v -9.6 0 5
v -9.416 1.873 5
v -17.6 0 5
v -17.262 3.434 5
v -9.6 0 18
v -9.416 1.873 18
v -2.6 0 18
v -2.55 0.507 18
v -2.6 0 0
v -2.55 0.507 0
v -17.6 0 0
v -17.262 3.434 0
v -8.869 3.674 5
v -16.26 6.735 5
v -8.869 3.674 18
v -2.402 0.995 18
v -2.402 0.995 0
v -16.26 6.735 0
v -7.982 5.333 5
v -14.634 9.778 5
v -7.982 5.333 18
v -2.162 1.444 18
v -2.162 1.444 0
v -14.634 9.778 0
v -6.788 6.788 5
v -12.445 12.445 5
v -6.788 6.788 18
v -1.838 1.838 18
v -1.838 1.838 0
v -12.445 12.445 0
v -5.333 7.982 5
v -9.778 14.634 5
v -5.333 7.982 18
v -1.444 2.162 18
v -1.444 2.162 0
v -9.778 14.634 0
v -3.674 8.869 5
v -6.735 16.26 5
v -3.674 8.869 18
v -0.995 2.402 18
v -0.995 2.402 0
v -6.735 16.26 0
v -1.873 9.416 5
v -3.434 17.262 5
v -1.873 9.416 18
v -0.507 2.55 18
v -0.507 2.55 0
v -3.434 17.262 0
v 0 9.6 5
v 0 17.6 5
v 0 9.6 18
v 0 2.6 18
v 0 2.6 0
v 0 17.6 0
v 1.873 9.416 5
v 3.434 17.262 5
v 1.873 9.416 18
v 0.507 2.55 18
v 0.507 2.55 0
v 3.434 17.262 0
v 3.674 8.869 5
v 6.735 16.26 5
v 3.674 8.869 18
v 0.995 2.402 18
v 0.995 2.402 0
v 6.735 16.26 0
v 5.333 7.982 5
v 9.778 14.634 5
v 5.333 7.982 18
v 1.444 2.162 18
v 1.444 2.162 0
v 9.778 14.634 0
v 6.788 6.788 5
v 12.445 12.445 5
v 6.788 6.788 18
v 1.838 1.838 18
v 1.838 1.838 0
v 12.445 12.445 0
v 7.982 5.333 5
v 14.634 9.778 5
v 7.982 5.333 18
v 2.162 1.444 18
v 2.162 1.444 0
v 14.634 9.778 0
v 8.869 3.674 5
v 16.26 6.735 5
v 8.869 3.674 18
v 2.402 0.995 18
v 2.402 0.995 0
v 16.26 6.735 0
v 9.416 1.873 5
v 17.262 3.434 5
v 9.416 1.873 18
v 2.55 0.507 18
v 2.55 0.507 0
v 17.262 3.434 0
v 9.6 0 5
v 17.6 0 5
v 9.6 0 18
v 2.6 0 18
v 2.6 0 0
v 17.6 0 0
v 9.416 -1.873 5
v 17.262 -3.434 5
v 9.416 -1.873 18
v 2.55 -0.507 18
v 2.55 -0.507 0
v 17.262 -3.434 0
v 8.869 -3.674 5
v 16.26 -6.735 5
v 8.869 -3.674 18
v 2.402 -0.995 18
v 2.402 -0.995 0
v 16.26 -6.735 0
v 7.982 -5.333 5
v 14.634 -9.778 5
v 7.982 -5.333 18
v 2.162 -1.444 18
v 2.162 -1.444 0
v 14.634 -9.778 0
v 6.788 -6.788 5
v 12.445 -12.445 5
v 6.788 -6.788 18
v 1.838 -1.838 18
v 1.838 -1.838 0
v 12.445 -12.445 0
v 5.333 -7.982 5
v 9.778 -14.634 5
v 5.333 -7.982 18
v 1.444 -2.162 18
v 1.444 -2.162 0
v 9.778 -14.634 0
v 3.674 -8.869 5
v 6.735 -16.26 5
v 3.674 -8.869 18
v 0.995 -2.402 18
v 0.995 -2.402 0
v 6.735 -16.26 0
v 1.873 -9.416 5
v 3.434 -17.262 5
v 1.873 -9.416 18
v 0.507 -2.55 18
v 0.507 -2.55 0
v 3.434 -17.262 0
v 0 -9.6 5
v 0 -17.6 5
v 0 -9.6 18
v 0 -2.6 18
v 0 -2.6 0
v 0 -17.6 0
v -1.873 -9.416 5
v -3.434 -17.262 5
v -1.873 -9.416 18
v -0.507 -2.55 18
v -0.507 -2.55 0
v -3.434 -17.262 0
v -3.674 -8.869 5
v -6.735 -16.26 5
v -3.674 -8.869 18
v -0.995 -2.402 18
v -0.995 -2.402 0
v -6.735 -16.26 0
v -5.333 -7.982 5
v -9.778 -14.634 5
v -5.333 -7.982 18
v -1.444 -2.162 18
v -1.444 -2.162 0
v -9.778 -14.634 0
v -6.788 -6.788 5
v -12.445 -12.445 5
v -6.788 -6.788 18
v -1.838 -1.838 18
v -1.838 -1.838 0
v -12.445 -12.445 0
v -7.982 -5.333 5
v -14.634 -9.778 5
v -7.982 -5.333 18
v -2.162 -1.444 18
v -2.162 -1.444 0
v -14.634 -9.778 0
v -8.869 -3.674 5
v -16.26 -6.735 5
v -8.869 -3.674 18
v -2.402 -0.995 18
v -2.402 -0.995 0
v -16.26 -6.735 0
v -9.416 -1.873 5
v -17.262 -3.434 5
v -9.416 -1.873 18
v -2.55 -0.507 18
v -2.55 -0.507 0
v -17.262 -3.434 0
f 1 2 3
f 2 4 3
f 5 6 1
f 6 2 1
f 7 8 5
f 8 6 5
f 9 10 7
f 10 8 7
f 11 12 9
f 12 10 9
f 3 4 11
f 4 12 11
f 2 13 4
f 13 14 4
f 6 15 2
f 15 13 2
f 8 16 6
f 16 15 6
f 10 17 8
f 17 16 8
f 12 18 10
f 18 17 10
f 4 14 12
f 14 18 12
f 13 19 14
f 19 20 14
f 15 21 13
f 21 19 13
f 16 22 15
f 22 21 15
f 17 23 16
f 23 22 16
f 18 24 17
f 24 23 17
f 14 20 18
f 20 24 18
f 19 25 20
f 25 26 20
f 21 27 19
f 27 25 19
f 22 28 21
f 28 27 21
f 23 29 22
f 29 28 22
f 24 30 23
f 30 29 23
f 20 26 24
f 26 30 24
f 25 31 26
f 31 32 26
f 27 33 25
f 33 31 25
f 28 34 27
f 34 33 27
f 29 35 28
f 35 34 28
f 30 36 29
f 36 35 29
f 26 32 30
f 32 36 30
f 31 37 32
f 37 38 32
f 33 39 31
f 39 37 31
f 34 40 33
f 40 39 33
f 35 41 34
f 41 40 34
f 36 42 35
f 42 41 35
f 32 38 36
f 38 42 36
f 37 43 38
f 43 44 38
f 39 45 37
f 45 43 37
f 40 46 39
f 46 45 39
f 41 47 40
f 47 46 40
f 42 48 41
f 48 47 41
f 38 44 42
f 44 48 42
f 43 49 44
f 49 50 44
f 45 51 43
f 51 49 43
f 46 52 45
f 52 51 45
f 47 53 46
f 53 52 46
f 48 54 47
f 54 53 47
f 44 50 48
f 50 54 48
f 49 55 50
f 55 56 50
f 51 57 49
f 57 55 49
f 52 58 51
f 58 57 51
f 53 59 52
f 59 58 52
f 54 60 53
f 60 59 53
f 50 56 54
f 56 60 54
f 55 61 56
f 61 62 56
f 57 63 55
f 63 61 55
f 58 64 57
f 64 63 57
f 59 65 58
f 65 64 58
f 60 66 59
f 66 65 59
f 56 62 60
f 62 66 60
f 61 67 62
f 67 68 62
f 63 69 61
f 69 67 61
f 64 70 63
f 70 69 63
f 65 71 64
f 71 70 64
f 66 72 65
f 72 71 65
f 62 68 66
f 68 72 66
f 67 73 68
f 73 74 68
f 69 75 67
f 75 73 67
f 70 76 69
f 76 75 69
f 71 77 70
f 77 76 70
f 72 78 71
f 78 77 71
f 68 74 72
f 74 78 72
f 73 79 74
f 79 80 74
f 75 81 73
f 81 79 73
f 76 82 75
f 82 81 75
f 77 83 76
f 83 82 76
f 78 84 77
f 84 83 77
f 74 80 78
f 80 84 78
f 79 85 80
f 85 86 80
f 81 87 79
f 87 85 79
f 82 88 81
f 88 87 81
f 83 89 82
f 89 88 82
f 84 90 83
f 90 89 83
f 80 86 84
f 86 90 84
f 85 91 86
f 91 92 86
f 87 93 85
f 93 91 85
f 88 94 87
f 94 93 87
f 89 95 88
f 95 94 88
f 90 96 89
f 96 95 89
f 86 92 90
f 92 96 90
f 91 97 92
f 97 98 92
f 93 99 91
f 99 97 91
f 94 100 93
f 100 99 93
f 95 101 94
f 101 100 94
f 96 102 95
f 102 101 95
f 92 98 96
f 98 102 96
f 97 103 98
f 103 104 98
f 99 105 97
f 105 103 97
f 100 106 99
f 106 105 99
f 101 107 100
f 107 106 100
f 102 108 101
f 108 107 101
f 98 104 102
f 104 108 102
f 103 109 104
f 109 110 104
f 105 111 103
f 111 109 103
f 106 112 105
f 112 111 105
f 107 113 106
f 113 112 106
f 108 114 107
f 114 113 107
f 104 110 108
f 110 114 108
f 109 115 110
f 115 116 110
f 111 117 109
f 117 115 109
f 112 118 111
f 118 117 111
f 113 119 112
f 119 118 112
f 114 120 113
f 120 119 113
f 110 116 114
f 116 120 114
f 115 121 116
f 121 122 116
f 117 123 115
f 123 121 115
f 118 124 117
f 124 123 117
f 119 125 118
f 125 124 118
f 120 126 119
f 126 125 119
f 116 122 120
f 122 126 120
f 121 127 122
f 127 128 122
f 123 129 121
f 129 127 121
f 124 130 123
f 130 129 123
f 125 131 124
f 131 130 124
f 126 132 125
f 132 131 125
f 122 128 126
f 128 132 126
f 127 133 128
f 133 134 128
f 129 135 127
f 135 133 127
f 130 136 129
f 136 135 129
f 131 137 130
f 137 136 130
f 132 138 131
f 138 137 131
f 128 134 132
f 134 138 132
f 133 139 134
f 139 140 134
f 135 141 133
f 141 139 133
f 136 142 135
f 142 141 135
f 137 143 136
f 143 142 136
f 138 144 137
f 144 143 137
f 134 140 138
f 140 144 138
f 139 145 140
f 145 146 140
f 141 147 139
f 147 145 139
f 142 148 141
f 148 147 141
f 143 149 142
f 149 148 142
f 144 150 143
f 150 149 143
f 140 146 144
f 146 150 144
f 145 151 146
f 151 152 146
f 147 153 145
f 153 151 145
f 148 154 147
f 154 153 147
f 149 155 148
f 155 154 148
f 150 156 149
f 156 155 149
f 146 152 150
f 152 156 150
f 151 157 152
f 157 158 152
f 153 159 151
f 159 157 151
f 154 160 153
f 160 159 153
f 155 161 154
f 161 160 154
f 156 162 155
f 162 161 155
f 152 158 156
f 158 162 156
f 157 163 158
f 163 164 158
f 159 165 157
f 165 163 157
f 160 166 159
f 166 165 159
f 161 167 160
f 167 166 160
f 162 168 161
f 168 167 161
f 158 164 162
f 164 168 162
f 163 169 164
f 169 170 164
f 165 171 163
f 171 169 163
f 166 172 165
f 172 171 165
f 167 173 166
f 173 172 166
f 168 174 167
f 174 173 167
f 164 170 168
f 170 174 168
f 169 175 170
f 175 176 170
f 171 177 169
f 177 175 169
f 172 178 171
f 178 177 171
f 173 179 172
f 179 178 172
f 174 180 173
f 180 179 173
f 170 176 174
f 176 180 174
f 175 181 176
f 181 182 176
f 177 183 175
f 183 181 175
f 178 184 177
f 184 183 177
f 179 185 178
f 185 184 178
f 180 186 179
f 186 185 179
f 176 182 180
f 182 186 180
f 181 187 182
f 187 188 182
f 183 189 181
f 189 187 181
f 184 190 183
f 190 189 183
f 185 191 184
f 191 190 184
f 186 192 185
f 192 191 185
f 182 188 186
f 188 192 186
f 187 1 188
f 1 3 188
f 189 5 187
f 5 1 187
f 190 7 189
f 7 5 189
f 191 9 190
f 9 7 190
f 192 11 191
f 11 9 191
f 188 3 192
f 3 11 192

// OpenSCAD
$fn = 32;

// ----------------------------------------------------------------------
// Profiled standoff: flanged spacer, 18 mm long, bore 5.2 mm
// ----------------------------------------------------------------------

// --- parameters (mm) ---
revolve_angle = 360;      // full turn around the Z axis
profile_points = 6;       // points of the closed outline

profile = [[2.6, 0], [17.6, 0], [17.6, 5], [9.6, 5], [9.6, 18], [2.6, 18]];  // single closed polygon, 6 points, counter clockwise

// --- the one profile operation ---
rotate_extrude(angle = revolve_angle) polygon(points = profile);
